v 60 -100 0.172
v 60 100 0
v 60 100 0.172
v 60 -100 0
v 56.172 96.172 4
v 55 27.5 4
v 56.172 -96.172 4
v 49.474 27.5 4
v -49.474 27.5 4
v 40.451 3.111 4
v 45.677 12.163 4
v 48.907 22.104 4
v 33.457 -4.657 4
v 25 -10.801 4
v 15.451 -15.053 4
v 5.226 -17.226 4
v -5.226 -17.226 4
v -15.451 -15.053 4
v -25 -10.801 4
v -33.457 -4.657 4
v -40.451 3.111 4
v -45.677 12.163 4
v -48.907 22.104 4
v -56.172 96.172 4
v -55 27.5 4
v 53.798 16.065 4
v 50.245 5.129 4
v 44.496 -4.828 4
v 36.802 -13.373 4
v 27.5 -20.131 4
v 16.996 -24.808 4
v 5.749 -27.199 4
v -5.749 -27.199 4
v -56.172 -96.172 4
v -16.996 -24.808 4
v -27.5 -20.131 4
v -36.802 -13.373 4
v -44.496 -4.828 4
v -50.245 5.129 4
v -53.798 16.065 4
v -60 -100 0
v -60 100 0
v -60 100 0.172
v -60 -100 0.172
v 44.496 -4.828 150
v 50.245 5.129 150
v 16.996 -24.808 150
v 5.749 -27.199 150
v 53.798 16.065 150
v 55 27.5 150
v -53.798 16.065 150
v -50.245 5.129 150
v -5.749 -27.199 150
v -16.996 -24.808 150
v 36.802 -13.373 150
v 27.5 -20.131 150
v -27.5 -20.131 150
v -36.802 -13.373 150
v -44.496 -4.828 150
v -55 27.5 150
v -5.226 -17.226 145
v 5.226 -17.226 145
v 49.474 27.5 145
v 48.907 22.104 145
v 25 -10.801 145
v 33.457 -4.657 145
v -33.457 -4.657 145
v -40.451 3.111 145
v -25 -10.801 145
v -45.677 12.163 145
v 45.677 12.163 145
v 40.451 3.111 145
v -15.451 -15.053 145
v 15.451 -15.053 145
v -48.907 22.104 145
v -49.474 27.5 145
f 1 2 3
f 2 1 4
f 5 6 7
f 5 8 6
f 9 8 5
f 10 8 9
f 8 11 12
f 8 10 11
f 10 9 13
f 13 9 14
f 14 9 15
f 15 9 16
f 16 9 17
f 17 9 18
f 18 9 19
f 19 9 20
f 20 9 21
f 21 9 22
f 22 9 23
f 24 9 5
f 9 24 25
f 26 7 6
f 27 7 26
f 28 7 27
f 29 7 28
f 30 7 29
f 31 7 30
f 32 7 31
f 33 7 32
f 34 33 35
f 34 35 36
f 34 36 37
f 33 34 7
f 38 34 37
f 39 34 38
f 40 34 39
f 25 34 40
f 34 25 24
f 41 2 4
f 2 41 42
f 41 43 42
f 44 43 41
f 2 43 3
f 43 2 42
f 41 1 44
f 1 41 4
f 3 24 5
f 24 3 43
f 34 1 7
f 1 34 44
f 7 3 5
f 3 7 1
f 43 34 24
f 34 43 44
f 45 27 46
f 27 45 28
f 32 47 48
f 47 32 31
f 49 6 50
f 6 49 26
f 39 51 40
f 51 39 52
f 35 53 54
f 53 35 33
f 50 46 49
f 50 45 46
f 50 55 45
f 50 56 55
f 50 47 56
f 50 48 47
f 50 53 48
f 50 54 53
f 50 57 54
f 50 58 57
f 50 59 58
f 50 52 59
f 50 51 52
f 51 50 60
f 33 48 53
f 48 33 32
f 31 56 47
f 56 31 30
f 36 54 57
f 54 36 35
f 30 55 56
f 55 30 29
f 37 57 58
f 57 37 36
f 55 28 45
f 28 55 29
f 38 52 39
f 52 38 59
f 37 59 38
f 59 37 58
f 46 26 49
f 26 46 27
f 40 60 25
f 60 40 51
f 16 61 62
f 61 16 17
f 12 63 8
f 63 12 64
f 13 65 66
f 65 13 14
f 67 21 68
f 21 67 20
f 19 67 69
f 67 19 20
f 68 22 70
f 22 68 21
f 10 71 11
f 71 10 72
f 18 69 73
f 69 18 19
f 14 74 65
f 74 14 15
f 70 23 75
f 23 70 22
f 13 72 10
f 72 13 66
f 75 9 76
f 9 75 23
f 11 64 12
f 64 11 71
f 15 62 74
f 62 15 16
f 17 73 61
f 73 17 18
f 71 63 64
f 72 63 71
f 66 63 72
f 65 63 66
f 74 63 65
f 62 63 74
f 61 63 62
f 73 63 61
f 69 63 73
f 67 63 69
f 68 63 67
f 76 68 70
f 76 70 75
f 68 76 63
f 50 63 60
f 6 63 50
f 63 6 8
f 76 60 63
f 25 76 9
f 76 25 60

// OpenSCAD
//Headphone Stand
//By Matthew Croft
//v.2 January 14,2019


//parameters-------------------------------------------------
cm=10;

//render-----------------------------------------------------
stand();

//modules----------------------------------------------------
module stand() {
//bottom
difference(){
translate([0,0,cm*0.2]) cube([cm*12,cm*20,cm*0.4], center=true);
//smoothing base
translate([0,cm*12.8,-cm*2.5]) rotate([-45,0,0]) cube([cm*14,cm*10,cm*0.4], center=true); 
translate([0,cm*-12.8,-cm*2.5]) rotate([45,0,0]) cube([cm*14,cm*10,cm*0.4], center=true); 
translate([cm*7.3,0,-cm]) rotate([0,45,0]) cube([cm*5,cm*21,cm*0.4], center=true); 
translate([cm*-7.3,0,-cm]) rotate([0,-45,0]) cube([cm*5,cm*21,cm*0.4], center=true); 
}
//holder
translate([0,cm*11/4,0]) {
difference(){
translate([0,0,cm*7.5])cylinder(h=cm*15,d=cm*11,center=true);
translate([0,cm*.5,cm*7.5-cm])cylinder(h=cm*16,d=cm*10,center=true);
translate([0,cm*7.5,cm*7+0.45*cm-cm])cube([cm*14,cm*15,cm*20], center=true);
}
//Screw holes



}
}
